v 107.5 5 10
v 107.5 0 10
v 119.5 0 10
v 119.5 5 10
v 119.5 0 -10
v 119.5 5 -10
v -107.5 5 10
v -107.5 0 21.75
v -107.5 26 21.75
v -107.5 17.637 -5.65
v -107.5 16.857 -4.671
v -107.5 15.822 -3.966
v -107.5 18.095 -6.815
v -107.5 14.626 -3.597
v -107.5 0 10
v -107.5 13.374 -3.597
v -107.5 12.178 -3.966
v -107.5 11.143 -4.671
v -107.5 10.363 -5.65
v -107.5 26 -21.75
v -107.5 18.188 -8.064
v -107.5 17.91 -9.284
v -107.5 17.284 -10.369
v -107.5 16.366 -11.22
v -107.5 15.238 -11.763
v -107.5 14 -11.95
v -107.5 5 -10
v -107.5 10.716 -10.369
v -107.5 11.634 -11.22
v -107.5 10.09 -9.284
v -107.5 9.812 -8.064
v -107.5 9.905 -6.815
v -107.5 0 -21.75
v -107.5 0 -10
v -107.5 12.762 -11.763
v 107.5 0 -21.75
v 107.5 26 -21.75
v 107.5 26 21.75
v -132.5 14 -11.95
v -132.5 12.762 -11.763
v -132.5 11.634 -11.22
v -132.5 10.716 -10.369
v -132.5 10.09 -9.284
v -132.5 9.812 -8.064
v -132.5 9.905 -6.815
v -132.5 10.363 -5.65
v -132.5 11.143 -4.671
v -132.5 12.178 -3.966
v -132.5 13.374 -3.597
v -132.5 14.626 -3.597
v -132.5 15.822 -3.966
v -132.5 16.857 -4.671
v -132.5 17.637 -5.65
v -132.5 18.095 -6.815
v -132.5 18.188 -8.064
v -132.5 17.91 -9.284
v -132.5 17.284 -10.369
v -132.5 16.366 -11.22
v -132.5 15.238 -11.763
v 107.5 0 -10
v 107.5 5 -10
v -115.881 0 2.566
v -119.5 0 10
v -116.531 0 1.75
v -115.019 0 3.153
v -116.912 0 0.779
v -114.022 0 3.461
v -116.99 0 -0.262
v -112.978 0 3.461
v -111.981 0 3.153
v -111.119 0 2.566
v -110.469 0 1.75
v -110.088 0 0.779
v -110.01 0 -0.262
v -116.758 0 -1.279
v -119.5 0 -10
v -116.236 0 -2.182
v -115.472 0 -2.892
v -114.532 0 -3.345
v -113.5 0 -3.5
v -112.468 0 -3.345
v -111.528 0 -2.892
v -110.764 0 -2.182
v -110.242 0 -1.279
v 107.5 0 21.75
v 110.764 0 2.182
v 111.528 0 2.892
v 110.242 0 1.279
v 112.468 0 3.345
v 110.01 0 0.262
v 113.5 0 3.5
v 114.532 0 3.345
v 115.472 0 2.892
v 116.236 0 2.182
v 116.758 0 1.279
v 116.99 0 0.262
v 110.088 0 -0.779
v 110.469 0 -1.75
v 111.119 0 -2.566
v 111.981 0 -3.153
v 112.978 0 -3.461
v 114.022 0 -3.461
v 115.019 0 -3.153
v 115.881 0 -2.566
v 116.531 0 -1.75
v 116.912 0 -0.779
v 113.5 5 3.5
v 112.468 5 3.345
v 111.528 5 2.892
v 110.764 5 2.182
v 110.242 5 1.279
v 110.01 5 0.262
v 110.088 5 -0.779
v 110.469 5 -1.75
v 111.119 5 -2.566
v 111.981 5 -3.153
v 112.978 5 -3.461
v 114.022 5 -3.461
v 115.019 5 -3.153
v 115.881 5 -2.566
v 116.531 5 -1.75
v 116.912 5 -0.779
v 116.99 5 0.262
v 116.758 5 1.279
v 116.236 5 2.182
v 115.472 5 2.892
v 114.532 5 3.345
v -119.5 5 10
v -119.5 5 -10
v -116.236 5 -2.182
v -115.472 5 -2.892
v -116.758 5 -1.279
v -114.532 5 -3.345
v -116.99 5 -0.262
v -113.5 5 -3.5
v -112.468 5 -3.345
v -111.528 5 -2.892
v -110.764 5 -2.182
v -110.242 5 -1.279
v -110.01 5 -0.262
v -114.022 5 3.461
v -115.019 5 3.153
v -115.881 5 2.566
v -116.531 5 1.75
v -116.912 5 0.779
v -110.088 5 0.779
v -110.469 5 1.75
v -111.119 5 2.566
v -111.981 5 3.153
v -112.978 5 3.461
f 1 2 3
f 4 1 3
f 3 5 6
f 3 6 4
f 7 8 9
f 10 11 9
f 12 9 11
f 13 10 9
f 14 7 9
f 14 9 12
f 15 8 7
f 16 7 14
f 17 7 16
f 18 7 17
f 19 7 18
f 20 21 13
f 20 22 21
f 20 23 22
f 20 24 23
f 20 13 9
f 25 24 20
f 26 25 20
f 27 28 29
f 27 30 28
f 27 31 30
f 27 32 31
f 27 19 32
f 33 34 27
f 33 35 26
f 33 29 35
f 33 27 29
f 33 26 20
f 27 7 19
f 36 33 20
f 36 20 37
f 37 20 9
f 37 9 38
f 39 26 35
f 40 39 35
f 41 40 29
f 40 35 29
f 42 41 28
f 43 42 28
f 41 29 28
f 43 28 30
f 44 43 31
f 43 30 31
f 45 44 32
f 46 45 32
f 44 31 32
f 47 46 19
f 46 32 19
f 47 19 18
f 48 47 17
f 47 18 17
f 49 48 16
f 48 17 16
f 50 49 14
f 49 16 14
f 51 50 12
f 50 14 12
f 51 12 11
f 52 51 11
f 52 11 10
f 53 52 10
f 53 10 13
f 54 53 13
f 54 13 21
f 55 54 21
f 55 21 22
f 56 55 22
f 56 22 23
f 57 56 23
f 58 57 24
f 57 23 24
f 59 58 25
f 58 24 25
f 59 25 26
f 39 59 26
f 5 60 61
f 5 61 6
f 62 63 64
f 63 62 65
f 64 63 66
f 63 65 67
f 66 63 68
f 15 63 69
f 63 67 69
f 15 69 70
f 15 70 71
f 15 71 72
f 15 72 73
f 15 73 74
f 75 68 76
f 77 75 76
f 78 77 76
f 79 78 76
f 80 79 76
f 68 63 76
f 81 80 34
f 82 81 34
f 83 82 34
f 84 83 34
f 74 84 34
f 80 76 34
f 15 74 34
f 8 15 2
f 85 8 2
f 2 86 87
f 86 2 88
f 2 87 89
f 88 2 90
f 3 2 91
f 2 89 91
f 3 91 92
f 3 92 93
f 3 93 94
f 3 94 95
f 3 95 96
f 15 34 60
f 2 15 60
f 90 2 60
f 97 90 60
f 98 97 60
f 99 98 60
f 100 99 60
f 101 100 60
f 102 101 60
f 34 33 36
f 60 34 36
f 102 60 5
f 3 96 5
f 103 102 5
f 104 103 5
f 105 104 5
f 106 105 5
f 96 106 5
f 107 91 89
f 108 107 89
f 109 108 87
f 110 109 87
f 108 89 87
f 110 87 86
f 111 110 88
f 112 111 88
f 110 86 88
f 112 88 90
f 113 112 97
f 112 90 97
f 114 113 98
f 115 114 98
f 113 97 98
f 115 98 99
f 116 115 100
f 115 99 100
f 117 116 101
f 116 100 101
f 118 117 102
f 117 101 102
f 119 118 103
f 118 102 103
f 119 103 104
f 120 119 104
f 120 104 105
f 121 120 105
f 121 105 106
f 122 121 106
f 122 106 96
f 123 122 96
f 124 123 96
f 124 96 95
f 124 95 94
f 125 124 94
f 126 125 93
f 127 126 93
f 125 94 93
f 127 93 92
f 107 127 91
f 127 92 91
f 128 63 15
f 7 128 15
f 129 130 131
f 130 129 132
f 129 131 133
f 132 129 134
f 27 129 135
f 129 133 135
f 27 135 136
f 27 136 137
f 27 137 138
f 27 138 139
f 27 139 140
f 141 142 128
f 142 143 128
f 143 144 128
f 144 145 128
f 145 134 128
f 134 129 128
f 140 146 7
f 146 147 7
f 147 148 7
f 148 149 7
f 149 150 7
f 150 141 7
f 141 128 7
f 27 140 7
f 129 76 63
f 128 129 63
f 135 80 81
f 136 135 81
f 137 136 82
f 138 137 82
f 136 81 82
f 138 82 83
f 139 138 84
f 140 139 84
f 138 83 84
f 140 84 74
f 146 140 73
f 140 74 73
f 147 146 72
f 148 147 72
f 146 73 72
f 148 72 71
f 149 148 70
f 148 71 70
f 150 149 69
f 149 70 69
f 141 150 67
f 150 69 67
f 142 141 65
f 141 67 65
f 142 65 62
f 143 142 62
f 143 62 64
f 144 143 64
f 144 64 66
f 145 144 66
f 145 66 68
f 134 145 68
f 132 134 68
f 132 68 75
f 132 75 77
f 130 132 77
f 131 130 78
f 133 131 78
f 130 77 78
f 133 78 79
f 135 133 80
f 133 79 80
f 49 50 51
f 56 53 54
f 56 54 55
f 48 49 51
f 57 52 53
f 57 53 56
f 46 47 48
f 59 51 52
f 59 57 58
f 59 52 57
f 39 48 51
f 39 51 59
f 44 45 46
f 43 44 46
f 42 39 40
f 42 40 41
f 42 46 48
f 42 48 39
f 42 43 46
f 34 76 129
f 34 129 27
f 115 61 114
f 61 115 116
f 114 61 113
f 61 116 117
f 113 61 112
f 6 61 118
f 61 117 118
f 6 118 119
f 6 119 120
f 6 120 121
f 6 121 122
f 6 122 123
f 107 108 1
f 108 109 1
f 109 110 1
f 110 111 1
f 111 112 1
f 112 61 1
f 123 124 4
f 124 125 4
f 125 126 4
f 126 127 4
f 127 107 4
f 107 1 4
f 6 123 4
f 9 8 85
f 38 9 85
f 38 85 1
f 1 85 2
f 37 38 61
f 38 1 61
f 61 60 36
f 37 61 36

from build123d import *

# Parameters (mm, degrees)
SKETCH_1_W      = 215
SKETCH_1_H      = 43.5
EXTRUDE_1_DEPTH = 26
SKETCH_2_W      = 12
SKETCH_2_H      = 20
SKETCH_2_R      = 3.5
EXTRUDE_2_DEPTH = 5
SKETCH_3_R      = 4.2
EXTRUDE_3_DEPTH = 25


with BuildPart() as part:
    # ｽｹｯﾁ1 → ﾎﾞｽ - 押し出し1 (new body)
    with BuildSketch(Plane(origin=(0, 0, 0), x_dir=(1, 0, 0), z_dir=(0, 1, 0))):
        Rectangle(SKETCH_1_W, SKETCH_1_H)
    extrude(amount=EXTRUDE_1_DEPTH)

    # ｽｹｯﾁ2 → ﾎﾞｽ - 押し出し2 (add)
    # profile 1 of 2: a face of its own
    with BuildSketch(Plane.XZ):
        with Locations((-113.5, 0)):
            Rectangle(SKETCH_2_W, SKETCH_2_H)
        with Locations(Location((-113.5, 0, 0), (0, 0, 270))):
            Circle(SKETCH_2_R, mode=Mode.SUBTRACT)
    # profile 2 of 2: a face of its own
    with BuildSketch(Plane.XZ):
        with Locations((113.5, 0)):
            Rectangle(SKETCH_2_W, SKETCH_2_H)
        with Locations(Location((113.5, 0, 0), (0, 0, 90))):
            Circle(SKETCH_2_R, mode=Mode.SUBTRACT)
    extrude(amount=-EXTRUDE_2_DEPTH)

    # ｽｹｯﾁ3 → ﾎﾞｽ - 押し出し3 (add)
    with BuildSketch(Plane.ZY.offset(107.5)):
        with Locations(Location((-7.75, 14, 0), (0, 0, 180))):
            Circle(SKETCH_3_R)
    extrude(amount=EXTRUDE_3_DEPTH)


solid = part.part
